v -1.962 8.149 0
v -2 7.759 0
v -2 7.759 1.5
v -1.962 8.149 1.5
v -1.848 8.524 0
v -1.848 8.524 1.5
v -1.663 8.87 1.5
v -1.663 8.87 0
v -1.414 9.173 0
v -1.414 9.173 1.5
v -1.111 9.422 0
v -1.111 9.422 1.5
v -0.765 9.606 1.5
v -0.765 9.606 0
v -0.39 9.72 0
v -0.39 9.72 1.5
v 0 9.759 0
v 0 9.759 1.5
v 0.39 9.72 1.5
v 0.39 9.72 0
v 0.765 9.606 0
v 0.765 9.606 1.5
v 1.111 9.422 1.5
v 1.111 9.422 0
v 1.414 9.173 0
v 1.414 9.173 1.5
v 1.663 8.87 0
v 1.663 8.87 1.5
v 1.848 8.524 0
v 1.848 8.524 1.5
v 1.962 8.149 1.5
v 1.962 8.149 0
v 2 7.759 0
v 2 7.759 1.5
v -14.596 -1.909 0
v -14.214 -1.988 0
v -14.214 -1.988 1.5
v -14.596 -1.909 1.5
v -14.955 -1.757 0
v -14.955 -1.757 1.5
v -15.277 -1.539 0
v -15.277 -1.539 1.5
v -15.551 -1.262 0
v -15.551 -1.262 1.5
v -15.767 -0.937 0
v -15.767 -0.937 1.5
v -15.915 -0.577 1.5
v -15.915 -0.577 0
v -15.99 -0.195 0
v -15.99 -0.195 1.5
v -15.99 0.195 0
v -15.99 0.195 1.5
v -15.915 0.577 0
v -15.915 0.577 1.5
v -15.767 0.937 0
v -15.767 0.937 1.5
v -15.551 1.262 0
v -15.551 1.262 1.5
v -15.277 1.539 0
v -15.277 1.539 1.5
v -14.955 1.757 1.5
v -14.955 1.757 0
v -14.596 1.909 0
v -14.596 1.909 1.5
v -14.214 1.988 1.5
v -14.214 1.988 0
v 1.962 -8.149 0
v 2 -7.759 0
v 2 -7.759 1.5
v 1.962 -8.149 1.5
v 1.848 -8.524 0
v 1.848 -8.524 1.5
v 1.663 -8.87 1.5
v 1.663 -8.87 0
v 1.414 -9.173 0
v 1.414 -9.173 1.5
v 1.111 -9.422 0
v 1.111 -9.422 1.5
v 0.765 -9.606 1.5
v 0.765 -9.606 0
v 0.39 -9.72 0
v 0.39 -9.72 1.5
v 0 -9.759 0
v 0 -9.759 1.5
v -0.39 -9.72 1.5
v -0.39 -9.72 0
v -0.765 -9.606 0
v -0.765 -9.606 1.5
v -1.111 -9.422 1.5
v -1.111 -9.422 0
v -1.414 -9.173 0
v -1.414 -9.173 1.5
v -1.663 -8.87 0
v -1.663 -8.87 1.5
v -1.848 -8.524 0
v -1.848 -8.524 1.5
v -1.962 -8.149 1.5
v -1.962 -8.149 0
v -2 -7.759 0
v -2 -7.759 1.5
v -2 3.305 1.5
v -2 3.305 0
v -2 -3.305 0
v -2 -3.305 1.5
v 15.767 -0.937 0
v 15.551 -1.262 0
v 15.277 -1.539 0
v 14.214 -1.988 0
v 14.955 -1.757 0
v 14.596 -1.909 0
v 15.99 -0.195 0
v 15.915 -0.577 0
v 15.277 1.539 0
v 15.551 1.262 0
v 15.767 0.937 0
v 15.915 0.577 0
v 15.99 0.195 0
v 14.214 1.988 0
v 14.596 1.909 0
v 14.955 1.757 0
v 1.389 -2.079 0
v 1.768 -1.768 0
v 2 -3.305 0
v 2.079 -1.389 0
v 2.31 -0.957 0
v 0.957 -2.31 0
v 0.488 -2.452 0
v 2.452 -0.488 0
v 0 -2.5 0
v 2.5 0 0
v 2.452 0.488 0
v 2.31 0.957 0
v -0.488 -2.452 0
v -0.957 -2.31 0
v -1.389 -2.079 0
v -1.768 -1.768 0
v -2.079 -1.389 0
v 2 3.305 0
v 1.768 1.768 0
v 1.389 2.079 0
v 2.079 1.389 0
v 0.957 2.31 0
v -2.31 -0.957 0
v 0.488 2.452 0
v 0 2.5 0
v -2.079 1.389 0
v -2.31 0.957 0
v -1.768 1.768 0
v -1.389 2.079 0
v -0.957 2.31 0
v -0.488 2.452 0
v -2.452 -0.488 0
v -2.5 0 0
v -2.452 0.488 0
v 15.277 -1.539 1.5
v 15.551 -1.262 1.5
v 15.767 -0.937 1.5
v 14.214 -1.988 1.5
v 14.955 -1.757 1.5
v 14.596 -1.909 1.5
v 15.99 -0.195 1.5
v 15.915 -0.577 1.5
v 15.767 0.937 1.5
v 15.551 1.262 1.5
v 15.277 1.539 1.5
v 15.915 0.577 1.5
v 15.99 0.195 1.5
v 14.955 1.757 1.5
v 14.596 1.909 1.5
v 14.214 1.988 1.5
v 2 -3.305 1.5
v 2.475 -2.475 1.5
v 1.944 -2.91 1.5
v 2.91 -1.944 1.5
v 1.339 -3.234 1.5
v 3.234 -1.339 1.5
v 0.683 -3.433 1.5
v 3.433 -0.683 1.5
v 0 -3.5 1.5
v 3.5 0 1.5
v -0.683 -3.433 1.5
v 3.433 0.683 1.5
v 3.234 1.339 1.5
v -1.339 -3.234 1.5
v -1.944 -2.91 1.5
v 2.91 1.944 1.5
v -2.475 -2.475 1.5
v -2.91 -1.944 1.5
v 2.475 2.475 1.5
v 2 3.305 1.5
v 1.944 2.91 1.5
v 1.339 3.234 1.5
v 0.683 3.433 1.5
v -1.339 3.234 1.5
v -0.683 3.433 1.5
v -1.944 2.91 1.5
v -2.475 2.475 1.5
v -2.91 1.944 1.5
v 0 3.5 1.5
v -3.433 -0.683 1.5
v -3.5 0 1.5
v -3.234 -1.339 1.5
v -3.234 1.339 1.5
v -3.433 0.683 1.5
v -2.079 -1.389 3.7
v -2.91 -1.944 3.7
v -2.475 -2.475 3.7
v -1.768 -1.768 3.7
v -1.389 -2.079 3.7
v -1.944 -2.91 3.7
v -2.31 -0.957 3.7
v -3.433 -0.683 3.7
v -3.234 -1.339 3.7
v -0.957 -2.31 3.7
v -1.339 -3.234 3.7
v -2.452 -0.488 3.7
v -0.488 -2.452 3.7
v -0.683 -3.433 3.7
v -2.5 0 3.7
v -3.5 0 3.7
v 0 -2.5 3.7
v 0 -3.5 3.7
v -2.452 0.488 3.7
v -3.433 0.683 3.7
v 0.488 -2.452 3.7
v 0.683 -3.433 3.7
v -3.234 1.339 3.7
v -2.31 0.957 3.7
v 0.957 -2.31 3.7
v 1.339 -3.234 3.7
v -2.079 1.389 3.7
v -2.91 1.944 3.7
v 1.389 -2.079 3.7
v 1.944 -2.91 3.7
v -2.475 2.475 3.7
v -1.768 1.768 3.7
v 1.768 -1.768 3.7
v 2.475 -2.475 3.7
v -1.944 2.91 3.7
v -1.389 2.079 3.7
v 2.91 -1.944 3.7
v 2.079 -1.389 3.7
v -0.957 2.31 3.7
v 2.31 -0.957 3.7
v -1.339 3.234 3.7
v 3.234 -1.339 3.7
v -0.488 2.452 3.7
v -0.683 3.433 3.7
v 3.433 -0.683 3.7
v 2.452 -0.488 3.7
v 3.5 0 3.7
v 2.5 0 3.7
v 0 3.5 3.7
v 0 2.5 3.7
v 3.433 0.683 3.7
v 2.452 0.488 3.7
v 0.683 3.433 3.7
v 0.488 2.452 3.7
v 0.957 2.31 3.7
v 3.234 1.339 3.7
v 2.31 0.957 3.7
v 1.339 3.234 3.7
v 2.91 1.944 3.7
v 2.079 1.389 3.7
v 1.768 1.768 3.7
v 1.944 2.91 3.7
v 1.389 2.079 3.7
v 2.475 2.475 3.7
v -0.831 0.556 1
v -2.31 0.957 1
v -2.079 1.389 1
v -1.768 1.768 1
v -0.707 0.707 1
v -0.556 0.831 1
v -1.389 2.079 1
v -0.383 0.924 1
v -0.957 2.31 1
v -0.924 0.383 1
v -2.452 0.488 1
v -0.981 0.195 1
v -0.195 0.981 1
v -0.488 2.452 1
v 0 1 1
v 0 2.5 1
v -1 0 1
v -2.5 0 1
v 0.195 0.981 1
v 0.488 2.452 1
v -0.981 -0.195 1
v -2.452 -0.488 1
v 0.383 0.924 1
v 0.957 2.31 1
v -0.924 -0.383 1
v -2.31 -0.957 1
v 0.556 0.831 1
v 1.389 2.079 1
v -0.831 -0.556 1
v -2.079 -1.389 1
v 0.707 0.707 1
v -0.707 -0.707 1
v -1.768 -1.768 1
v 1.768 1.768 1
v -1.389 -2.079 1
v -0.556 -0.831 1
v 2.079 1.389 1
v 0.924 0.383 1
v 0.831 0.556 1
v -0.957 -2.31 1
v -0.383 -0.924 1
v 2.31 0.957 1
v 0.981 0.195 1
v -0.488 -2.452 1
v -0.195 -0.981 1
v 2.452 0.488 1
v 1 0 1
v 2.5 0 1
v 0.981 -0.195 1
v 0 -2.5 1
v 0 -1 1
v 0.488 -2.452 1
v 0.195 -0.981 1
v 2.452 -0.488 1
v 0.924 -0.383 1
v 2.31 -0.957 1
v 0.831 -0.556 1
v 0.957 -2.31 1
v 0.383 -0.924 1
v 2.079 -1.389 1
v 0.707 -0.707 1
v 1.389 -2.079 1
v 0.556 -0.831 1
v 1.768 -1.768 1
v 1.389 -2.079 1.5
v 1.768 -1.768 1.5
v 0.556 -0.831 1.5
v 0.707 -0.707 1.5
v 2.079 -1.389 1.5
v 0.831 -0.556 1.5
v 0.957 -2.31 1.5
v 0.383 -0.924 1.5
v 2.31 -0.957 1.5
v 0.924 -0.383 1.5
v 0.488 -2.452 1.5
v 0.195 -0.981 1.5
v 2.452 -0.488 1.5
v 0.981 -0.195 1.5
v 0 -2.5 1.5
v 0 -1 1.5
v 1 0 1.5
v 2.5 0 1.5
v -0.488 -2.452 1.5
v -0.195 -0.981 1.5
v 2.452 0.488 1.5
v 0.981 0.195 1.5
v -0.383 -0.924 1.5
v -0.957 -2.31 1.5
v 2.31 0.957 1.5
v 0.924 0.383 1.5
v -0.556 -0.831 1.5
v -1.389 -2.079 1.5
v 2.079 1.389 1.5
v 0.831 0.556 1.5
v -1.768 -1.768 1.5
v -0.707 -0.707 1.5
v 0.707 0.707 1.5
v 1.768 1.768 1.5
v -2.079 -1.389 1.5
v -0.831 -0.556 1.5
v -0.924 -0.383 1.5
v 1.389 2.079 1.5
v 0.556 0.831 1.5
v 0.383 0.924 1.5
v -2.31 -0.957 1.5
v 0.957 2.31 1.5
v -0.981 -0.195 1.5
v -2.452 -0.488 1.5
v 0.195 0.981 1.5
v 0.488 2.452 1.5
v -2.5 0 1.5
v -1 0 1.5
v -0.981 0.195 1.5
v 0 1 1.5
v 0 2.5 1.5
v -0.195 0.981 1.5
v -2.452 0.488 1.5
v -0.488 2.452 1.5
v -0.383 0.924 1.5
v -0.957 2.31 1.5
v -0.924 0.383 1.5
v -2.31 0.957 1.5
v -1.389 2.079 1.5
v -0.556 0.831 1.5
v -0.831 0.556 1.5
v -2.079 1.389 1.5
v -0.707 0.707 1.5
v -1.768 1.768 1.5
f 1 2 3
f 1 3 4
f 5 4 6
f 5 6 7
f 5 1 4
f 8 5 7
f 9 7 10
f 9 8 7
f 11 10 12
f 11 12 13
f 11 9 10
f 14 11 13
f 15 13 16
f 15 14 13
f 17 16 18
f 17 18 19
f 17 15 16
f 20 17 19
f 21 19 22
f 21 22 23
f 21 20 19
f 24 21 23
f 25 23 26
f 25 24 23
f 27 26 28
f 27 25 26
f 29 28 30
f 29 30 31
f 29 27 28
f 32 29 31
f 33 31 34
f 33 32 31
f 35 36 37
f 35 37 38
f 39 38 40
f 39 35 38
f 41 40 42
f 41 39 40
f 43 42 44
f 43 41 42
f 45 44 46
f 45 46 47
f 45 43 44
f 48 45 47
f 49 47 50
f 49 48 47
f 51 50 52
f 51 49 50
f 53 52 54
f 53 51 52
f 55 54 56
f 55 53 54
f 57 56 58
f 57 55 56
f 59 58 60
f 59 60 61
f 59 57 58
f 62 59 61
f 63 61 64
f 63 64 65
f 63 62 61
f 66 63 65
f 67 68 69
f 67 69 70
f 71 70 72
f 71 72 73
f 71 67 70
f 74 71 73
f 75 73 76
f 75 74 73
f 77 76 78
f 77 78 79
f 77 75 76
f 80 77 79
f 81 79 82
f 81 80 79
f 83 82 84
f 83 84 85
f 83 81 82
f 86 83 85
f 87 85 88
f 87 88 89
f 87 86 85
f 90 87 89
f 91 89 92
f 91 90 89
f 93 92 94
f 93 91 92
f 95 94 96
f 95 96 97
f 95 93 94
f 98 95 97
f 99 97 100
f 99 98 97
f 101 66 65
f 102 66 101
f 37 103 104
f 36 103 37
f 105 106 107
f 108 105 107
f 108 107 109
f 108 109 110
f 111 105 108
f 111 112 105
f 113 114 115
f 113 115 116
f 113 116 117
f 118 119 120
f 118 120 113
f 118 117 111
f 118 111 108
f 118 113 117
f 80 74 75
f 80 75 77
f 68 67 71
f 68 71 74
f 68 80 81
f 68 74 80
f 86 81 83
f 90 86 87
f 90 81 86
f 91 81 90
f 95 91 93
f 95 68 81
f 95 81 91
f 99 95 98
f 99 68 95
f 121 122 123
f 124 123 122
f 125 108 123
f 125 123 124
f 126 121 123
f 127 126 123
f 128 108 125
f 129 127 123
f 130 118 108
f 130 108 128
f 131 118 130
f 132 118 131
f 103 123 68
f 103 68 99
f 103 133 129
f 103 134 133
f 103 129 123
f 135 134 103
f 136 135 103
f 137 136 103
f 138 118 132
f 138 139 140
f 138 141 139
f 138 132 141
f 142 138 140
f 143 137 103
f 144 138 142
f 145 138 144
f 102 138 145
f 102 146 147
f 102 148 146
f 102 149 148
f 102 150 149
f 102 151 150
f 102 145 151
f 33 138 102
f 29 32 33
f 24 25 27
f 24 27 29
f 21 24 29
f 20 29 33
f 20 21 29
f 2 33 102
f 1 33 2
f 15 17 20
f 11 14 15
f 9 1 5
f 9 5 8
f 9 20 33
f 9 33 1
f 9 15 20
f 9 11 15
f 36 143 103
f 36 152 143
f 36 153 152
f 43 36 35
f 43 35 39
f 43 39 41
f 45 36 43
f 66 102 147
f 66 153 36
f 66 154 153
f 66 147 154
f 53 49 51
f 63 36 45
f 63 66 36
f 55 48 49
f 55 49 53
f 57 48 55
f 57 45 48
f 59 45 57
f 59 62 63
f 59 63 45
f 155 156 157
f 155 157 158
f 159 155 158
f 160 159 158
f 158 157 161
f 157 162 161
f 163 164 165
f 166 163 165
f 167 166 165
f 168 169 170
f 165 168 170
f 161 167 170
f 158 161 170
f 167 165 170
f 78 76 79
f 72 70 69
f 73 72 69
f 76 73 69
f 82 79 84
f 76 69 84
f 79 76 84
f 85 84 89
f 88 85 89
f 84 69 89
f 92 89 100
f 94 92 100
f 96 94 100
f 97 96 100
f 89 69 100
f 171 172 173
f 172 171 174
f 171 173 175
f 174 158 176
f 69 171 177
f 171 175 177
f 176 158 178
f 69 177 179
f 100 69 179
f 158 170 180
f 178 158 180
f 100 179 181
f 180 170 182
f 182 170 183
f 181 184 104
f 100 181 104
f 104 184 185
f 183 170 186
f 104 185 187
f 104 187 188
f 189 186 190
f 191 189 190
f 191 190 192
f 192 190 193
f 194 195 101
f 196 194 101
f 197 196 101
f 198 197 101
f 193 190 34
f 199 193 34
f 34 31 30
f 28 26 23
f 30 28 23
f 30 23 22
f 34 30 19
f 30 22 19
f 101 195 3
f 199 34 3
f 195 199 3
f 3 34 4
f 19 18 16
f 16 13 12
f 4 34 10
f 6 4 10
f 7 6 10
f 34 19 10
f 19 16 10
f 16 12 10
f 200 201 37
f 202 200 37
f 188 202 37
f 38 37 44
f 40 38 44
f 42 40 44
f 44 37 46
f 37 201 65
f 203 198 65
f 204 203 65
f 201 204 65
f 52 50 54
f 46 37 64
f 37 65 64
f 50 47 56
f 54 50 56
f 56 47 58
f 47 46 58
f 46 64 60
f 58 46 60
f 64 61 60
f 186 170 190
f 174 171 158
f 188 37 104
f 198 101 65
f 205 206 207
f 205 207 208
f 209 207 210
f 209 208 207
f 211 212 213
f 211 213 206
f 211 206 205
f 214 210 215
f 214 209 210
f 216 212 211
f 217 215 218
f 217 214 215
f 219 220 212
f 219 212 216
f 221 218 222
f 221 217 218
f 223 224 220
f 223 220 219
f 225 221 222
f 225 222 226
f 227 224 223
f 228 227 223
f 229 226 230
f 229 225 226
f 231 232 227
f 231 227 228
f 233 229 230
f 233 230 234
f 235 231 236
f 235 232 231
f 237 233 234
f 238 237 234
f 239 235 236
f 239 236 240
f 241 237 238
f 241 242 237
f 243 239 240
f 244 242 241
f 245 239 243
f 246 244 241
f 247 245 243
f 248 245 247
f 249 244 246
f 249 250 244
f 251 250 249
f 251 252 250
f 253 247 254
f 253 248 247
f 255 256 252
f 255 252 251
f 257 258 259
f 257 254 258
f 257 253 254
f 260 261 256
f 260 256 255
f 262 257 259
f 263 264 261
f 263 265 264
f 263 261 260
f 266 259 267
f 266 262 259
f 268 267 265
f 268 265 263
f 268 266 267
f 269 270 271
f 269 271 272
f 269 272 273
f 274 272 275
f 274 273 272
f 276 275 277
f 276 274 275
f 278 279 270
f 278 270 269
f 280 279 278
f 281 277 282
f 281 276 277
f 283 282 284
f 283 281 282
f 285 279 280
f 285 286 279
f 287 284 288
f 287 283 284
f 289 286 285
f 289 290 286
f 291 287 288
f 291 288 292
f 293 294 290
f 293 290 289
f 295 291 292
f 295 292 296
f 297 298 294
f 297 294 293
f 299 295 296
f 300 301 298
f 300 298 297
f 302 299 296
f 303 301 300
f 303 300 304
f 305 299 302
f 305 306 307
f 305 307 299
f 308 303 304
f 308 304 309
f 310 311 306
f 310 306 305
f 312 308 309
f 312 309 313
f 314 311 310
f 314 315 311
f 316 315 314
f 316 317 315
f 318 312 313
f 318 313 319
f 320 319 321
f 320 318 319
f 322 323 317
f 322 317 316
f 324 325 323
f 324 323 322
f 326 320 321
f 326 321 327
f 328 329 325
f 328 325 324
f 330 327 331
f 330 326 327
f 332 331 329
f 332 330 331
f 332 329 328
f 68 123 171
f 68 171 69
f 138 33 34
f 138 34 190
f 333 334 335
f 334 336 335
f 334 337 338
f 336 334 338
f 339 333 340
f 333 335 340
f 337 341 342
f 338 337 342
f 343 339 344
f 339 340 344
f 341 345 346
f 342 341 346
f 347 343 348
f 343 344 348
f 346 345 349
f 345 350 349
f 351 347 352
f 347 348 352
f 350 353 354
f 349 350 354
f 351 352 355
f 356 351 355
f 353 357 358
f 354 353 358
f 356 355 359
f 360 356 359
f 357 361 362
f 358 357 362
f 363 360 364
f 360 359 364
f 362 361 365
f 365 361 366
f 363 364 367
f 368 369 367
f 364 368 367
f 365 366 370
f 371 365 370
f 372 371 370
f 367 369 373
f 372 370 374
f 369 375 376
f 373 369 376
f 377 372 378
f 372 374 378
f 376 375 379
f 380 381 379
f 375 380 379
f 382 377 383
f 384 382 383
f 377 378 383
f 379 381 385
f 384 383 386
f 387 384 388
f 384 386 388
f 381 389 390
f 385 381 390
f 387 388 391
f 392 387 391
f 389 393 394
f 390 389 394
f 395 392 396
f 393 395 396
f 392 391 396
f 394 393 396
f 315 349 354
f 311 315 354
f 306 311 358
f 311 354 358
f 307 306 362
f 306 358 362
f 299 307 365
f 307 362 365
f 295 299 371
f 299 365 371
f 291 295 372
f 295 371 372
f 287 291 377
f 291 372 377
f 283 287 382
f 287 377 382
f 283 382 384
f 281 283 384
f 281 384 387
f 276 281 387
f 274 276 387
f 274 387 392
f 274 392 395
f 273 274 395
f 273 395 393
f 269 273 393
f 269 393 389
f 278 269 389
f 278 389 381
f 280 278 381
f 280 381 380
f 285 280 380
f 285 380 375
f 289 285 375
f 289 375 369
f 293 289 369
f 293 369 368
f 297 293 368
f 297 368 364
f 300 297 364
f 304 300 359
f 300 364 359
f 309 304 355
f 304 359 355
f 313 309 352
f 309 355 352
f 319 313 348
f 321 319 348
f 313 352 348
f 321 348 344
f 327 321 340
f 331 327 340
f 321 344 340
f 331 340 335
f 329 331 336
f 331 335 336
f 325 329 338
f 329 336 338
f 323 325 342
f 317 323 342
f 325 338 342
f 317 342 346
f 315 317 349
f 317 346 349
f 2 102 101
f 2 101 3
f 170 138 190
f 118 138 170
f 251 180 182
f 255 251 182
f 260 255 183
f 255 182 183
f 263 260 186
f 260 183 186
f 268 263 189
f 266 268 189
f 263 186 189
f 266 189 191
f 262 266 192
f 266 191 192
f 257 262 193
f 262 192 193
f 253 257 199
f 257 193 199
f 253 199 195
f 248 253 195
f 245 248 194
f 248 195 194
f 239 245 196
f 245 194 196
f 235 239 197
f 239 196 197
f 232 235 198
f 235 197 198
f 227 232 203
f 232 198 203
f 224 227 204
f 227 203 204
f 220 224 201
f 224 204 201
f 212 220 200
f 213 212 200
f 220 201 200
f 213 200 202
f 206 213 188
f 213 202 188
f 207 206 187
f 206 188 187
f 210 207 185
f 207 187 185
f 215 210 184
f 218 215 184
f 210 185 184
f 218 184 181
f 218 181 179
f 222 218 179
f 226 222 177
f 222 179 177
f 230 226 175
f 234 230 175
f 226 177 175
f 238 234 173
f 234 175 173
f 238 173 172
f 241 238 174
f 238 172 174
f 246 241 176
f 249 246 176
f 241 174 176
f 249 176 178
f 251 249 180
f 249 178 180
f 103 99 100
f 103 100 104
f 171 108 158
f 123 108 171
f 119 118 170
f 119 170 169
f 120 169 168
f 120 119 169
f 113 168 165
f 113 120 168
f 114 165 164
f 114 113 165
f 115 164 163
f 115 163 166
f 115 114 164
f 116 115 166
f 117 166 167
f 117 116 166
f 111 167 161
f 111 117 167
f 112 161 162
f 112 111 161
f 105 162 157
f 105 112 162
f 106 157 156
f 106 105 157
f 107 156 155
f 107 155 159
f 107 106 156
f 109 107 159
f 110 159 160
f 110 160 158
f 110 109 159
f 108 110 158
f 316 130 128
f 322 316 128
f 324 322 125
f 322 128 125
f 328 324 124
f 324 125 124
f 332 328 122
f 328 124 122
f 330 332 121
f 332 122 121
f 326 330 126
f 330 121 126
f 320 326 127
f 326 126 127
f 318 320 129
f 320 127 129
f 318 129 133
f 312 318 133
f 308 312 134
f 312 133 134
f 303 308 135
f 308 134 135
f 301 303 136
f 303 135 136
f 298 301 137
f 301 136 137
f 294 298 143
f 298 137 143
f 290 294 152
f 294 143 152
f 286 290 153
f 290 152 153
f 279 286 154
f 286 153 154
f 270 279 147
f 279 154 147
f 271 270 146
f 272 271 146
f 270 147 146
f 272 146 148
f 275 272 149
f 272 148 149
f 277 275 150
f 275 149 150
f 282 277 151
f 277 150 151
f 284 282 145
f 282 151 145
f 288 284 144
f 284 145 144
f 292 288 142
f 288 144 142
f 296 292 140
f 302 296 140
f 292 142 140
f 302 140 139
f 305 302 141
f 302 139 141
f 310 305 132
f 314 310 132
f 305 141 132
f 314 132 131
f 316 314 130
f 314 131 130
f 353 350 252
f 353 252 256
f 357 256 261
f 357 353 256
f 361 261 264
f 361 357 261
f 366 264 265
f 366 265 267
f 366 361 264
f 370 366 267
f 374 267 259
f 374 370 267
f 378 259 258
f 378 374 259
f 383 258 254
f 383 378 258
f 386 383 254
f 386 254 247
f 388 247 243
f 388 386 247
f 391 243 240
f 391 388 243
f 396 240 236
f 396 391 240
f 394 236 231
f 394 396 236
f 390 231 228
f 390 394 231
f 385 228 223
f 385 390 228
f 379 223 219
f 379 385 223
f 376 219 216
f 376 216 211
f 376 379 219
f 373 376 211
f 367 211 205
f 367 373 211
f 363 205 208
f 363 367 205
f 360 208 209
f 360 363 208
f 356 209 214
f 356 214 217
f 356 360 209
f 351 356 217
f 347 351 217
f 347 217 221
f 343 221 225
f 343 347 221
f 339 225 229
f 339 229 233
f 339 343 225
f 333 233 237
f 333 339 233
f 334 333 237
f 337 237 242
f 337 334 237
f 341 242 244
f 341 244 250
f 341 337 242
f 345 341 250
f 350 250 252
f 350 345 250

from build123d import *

# Parameters (mm, degrees)
BOSS_EXTRUDE1_DEPTH = 1.5
SKETCH2_R           = 3.5
SKETCH2_R_2         = 2.5
BOSS_EXTRUDE2_DEPTH = 2.2
CUT_EXTRUDE1_REACH  = 20.87
SKETCH3_R           = 1
SKETCH4_R           = 2.5
CUT_EXTRUDE2_DEPTH  = 1


with BuildPart() as part:
    # Sketch1 → Boss-Extrude1 (new body)
    with BuildSketch(Plane.XY):
        with BuildLine():
            Line((2, 7.75863865), (2, 3.304737557))
            Line((2, 3.304737557), (14.214285714, 1.988487272))
            ThreePointArc((14.214285714, 1.988487272), (16, 0), (14.214285714, -1.988487272))
            Line((14.214285714, -1.988487272), (2, -3.304737557))
            Line((2, -3.304737557), (2, -7.75863865))
            ThreePointArc((2, -7.75863865), (0, -9.75863865), (-2, -7.75863865))
            Line((-2, -7.75863865), (-2, -3.304737557))
            Line((-2, -3.304737557), (-14.214285714, -1.988487272))
            ThreePointArc((-14.214285714, -1.988487272), (-16, 0), (-14.214285714, 1.988487272))
            Line((-14.214285714, 1.988487272), (-2, 3.304737557))
            Line((-2, 3.304737557), (-2, 7.75863865))
            ThreePointArc((-2, 7.75863865), (0, 9.75863865), (2, 7.75863865))
        make_face()
    extrude(amount=BOSS_EXTRUDE1_DEPTH)

    # Sketch2 → Boss-Extrude2 (add)
    with BuildSketch(Plane.XY.offset(1.5)):
        Circle(SKETCH2_R)
        Circle(SKETCH2_R_2, mode=Mode.SUBTRACT)
    extrude(amount=BOSS_EXTRUDE2_DEPTH)

    # Sketch3 → Cut-Extrude1 (cut, up to next)
    with BuildSketch(Plane.XY.offset(1.5), mode=Mode.PRIVATE) as cut_extrude1_sk1:
        Circle(SKETCH3_R)
    cut_extrude1_tool1 = extrude(cut_extrude1_sk1.sketch, amount=-CUT_EXTRUDE1_REACH, mode=Mode.PRIVATE) & part.part
    add(cut_extrude1_tool1.solids().sort_by_distance((0, 0, 1.5))[0], mode=Mode.SUBTRACT)

    # Sketch4 → Cut-Extrude2 (cut)
    with BuildSketch(Plane(origin=(0, 0, 0), x_dir=(-1, 0, 0), z_dir=(0, 0, -1))):
        with Locations(Location((0, 0, 0), (0, 0, 180))):
            Circle(SKETCH4_R)
    extrude(amount=-CUT_EXTRUDE2_DEPTH, mode=Mode.SUBTRACT)


solid = part.part
